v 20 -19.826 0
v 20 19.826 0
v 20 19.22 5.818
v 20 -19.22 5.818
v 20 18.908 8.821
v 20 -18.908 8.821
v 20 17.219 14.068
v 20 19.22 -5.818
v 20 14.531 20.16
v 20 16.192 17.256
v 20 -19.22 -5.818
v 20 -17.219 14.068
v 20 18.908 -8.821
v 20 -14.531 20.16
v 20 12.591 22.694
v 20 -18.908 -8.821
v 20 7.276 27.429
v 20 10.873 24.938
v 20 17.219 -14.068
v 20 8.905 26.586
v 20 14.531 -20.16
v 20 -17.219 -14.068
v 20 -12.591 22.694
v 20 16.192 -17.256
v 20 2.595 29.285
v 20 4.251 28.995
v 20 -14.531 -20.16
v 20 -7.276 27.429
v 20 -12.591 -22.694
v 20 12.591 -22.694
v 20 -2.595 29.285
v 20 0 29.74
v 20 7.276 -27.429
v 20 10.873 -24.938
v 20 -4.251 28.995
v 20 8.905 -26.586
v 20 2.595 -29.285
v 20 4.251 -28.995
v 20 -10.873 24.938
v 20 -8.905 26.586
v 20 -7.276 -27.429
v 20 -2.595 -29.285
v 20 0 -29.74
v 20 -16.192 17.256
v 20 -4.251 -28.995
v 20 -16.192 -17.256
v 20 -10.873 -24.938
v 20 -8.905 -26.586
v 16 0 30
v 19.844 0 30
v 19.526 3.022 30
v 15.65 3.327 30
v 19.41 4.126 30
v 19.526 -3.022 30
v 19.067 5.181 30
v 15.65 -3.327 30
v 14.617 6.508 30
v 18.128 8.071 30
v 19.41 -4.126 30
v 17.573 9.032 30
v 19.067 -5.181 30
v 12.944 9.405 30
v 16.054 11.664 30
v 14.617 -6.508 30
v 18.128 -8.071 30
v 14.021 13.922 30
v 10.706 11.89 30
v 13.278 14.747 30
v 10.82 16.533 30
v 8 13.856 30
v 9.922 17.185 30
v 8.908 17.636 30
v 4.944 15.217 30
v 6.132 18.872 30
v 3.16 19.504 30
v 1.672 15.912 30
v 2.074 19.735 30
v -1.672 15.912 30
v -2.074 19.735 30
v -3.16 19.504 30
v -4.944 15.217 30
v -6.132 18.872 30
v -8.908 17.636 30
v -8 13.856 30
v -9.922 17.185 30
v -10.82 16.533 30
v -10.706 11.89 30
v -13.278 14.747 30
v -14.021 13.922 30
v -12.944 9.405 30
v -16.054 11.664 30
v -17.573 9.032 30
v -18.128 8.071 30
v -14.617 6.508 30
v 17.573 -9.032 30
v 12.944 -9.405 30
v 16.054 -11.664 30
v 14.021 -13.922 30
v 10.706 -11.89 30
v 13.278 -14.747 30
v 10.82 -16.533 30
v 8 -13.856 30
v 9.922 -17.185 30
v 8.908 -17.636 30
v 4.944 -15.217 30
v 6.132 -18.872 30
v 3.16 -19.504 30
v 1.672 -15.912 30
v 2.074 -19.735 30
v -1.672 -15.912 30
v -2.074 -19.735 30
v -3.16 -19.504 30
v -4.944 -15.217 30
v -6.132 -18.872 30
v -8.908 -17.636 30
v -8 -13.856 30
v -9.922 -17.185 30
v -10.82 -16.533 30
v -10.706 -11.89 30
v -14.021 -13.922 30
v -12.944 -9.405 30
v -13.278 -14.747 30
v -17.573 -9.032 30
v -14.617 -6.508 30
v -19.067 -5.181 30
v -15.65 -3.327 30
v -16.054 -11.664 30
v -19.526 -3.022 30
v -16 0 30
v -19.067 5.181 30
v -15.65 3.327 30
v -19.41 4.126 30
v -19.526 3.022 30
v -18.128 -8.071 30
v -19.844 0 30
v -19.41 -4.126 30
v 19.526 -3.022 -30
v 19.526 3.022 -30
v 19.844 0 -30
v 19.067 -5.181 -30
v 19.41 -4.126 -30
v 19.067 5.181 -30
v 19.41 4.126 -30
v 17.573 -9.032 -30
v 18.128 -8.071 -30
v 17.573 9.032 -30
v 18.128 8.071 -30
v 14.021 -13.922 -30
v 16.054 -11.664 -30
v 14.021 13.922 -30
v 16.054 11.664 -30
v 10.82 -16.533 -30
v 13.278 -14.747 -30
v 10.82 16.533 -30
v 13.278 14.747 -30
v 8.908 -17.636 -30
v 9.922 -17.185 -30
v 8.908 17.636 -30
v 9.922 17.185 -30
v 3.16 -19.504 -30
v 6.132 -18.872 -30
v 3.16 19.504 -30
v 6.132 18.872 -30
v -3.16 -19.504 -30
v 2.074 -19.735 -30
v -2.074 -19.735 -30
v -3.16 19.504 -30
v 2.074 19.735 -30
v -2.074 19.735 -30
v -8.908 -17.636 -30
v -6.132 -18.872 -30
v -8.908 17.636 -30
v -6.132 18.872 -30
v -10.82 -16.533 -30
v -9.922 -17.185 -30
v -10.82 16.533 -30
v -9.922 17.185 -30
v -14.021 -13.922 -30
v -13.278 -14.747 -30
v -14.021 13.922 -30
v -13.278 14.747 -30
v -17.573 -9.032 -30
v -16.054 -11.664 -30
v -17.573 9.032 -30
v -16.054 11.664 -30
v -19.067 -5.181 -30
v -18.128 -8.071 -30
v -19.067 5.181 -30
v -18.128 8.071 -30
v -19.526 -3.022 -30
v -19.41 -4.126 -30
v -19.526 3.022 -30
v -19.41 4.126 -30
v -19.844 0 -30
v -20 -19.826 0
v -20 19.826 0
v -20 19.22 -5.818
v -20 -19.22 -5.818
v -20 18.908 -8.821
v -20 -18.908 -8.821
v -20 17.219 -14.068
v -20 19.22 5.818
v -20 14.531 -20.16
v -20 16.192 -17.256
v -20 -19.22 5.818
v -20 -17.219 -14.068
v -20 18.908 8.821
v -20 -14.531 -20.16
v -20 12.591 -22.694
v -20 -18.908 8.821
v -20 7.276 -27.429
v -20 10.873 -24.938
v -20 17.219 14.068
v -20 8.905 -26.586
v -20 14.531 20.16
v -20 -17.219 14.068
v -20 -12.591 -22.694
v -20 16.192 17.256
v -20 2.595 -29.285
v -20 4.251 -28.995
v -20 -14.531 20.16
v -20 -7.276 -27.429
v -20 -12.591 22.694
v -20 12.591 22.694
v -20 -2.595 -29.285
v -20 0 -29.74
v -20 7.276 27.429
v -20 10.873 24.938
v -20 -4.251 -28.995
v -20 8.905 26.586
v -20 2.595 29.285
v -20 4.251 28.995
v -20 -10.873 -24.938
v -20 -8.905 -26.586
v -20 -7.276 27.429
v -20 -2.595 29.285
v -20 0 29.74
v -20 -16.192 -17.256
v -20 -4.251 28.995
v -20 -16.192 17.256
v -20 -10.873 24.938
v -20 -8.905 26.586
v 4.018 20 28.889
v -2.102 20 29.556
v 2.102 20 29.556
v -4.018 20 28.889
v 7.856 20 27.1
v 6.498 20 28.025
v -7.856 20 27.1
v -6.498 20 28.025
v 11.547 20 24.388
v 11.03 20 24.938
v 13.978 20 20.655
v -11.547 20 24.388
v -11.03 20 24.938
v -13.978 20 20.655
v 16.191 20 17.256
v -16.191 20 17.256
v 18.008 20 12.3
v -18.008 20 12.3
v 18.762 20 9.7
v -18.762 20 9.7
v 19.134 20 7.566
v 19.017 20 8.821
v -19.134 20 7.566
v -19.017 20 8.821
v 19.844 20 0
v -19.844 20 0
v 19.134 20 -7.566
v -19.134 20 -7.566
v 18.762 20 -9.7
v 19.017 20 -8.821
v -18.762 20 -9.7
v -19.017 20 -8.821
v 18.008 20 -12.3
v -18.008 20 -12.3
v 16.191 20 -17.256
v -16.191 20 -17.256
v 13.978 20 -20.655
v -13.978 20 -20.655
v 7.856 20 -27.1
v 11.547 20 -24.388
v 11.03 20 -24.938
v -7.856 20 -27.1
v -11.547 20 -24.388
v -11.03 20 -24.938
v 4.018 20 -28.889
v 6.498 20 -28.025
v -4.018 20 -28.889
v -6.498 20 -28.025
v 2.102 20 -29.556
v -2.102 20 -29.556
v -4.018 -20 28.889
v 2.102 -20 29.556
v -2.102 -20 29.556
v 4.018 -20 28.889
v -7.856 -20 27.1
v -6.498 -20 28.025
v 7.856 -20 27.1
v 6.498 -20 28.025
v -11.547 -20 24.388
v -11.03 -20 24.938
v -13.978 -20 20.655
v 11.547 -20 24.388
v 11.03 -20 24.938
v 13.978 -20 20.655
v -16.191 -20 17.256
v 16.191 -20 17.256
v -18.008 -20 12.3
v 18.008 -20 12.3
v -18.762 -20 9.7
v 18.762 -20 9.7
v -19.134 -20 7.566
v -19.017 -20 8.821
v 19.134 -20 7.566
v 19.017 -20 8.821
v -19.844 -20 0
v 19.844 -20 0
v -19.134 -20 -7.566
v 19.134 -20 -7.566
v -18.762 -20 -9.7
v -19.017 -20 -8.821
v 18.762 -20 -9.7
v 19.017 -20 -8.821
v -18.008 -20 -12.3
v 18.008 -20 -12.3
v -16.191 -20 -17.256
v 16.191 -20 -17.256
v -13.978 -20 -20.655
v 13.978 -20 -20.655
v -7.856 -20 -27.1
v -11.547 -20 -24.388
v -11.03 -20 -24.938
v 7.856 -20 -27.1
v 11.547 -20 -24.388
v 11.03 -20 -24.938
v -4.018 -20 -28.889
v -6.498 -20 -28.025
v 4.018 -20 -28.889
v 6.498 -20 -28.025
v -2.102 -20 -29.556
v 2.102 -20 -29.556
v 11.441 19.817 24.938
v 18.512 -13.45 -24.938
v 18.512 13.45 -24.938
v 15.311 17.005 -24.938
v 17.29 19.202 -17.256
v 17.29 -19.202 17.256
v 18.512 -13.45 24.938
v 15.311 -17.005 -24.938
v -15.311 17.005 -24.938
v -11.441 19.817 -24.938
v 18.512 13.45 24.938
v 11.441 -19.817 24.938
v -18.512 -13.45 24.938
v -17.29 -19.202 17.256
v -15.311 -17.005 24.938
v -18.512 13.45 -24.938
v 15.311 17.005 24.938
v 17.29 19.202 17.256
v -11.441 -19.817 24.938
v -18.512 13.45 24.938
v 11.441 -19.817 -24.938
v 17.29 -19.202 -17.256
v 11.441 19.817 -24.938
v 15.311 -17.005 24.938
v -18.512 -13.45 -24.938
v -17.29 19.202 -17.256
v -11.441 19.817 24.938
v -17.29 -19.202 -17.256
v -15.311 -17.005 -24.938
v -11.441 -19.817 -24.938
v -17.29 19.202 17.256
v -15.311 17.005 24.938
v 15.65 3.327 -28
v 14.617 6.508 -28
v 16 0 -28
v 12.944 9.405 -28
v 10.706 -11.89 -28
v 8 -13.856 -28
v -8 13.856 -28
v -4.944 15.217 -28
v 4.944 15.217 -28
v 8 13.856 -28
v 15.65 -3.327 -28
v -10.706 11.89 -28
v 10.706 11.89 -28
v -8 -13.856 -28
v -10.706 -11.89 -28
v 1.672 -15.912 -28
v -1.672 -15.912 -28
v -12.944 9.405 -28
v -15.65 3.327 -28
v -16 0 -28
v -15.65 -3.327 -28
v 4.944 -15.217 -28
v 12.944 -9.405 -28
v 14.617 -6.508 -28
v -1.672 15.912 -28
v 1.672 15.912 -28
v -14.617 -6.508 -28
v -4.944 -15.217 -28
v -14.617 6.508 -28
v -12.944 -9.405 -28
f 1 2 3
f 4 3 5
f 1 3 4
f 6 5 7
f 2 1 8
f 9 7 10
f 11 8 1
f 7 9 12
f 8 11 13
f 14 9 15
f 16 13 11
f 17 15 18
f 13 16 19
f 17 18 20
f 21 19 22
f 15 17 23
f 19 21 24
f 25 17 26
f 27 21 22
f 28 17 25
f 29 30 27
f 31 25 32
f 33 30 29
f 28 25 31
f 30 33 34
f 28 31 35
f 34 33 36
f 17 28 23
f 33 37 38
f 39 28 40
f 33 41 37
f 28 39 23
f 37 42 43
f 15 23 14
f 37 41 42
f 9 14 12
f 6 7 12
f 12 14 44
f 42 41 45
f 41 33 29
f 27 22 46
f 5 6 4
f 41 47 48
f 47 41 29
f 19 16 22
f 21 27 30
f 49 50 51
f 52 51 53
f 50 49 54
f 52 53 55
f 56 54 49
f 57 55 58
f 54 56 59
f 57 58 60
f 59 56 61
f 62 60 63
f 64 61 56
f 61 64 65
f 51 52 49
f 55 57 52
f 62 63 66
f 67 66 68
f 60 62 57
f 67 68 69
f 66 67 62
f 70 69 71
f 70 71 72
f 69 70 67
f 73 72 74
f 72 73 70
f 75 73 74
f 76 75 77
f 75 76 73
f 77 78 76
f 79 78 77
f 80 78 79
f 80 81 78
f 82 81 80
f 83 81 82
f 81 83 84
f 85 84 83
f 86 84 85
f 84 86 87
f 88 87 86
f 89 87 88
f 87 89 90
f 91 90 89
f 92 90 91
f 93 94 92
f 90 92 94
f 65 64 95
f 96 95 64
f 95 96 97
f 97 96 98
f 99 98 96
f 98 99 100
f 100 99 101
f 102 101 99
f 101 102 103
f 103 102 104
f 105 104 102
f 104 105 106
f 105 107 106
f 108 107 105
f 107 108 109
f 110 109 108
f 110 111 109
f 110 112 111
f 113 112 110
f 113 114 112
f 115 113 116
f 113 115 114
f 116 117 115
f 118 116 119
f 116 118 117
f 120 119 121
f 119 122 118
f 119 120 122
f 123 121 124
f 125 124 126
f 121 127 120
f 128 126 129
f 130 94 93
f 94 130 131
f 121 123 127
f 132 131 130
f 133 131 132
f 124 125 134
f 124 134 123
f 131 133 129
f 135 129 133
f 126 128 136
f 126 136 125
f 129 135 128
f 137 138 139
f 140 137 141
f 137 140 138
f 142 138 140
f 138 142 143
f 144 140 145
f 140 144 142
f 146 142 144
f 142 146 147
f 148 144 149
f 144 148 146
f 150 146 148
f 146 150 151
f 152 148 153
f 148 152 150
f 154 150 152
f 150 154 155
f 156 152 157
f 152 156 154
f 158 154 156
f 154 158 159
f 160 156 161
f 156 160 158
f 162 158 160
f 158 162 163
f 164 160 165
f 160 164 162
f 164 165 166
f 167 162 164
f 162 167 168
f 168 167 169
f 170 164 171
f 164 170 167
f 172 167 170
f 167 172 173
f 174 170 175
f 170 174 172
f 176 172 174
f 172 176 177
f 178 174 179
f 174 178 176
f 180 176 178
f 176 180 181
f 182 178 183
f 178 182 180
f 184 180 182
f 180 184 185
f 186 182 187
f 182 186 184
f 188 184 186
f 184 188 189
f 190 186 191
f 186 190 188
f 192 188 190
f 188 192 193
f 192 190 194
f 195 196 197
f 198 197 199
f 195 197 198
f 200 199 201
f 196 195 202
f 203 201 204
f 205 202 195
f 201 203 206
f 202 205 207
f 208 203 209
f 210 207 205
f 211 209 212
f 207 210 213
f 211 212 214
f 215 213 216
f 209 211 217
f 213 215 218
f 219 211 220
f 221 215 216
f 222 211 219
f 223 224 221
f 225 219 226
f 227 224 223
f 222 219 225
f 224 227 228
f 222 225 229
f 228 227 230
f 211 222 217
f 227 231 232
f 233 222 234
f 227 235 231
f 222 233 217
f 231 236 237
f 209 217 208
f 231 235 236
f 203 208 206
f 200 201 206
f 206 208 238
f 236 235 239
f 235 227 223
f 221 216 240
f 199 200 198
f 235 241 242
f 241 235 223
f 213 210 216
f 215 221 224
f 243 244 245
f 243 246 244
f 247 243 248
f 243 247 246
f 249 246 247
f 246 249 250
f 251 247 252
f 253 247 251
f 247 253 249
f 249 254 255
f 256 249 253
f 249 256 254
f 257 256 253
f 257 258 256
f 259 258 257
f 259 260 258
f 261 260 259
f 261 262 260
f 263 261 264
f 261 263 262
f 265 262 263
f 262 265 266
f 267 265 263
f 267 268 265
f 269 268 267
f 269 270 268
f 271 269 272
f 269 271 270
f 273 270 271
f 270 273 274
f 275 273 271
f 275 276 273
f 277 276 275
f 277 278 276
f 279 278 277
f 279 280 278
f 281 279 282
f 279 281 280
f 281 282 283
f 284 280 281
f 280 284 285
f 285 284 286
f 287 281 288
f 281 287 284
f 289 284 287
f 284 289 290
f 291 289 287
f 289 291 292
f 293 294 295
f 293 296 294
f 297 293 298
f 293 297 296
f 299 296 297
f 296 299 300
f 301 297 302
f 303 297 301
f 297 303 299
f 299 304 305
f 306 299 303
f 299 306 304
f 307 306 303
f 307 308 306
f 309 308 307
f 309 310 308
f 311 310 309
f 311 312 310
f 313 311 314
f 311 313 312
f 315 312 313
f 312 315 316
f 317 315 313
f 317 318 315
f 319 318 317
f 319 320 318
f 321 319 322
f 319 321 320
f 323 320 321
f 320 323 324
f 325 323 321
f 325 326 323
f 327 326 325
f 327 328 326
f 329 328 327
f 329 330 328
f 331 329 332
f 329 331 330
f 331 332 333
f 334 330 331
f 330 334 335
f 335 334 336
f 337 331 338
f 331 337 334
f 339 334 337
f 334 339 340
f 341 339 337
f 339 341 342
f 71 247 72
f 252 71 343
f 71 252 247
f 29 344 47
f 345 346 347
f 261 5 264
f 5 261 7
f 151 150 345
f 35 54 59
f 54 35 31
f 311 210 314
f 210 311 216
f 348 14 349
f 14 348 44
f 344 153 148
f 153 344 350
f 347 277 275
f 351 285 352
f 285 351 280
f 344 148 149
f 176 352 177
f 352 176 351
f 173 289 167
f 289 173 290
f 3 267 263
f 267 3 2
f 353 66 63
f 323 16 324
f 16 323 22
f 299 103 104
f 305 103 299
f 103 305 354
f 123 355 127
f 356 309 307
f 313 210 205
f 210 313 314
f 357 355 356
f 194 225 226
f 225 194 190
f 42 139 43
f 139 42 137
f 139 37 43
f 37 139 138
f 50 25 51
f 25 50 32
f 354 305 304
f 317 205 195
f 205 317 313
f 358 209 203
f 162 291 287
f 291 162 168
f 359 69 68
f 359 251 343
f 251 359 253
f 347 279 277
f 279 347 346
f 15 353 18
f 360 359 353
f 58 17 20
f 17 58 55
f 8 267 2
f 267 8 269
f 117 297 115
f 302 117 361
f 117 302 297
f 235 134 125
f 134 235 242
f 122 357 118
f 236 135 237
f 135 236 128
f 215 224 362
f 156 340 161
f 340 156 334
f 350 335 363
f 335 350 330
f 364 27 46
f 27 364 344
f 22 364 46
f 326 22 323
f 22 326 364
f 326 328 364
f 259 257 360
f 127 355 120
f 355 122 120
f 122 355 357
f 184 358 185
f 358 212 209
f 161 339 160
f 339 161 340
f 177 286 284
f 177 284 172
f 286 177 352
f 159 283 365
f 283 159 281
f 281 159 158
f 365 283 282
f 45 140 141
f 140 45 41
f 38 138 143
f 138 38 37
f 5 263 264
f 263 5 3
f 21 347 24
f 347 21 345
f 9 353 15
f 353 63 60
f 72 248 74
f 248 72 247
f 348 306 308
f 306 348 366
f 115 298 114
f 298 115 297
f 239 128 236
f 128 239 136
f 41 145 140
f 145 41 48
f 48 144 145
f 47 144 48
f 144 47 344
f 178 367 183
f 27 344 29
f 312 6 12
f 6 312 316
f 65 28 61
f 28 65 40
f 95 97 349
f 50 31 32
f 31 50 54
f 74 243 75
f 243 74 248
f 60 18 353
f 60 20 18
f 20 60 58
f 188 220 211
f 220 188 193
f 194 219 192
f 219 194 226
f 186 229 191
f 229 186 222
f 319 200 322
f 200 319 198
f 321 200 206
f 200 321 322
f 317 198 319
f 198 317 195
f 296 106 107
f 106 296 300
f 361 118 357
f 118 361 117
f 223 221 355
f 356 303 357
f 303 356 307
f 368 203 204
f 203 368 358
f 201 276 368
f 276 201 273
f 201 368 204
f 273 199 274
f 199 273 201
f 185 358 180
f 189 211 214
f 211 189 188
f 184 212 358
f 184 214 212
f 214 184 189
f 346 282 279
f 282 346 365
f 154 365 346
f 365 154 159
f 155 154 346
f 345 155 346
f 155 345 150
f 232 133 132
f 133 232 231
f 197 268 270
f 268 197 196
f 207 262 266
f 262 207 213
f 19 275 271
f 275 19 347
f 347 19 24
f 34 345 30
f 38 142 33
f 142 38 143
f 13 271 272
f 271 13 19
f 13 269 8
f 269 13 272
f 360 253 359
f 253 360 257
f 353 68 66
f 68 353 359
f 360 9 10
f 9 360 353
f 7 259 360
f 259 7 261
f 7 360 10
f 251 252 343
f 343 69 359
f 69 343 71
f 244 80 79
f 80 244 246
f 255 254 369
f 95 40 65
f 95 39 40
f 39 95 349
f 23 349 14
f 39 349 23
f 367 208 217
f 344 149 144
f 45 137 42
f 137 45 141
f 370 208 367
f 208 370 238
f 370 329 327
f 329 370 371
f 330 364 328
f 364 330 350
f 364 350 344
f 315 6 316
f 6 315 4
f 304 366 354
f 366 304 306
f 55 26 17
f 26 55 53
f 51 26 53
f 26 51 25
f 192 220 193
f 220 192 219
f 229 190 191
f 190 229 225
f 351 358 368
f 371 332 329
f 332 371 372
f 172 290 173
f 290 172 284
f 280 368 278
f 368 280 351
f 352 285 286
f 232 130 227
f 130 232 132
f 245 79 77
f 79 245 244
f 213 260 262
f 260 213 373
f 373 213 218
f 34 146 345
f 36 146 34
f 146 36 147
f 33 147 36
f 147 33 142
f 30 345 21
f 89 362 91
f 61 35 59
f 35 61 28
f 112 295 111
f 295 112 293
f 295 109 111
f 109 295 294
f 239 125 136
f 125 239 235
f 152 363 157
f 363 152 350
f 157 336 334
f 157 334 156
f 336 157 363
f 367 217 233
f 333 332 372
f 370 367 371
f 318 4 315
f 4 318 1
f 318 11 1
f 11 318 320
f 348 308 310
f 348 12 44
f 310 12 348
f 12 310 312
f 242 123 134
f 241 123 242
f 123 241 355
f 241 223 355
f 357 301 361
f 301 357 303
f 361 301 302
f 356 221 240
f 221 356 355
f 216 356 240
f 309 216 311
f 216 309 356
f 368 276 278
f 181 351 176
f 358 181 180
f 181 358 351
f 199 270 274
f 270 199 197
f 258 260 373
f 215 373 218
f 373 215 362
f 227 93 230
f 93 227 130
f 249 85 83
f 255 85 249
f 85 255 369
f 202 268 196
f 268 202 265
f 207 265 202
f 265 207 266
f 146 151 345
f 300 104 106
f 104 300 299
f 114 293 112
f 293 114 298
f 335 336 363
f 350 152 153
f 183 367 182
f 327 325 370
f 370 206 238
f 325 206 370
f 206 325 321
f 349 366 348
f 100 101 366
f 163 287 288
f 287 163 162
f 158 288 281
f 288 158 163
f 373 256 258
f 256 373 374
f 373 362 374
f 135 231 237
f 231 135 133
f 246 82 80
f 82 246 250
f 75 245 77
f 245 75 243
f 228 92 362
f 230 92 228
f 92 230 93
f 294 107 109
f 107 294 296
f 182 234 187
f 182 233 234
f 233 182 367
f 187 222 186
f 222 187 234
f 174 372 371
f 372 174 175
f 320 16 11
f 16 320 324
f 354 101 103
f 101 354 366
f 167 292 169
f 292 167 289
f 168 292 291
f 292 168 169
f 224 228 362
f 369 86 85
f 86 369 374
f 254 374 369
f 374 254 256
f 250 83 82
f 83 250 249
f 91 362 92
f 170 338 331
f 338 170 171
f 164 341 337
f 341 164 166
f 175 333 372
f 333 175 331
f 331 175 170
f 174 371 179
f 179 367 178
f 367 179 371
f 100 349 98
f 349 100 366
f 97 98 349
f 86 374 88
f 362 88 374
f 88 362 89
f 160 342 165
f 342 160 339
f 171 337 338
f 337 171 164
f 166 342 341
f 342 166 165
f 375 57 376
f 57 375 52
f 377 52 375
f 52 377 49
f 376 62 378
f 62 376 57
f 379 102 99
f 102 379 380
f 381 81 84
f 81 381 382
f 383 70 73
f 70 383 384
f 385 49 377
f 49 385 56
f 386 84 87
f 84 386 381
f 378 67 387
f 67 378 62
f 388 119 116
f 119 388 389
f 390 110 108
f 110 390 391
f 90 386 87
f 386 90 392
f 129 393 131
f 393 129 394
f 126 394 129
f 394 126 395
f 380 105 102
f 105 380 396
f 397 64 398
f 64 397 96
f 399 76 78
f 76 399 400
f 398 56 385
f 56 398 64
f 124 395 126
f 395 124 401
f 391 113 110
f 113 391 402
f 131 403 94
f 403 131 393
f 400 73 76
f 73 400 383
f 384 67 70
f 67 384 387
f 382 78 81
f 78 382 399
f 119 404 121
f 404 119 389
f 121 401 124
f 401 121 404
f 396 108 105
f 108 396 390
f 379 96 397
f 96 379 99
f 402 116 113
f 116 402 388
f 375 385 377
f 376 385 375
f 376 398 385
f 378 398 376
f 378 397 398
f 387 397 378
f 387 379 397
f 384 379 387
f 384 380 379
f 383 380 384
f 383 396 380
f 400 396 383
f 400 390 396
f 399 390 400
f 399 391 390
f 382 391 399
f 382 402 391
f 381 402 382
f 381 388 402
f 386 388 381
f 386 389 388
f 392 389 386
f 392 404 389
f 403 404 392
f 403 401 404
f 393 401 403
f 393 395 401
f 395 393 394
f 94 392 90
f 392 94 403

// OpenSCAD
 // parameters
 width=40;
 height=60;
 bottom_thickness=2;
 wall_thickness=4;
 // render
    difference() {
        intersection() {
          cube([width,width,height], center=true);
            scale([1,1,height/width])
          sphere(width/2 * sqrt(2) );
        }
        translate([0,0,-height/2+bottom_thickness]) 
            cylinder(r=width/2-wall_thickness,h=height);
    }
